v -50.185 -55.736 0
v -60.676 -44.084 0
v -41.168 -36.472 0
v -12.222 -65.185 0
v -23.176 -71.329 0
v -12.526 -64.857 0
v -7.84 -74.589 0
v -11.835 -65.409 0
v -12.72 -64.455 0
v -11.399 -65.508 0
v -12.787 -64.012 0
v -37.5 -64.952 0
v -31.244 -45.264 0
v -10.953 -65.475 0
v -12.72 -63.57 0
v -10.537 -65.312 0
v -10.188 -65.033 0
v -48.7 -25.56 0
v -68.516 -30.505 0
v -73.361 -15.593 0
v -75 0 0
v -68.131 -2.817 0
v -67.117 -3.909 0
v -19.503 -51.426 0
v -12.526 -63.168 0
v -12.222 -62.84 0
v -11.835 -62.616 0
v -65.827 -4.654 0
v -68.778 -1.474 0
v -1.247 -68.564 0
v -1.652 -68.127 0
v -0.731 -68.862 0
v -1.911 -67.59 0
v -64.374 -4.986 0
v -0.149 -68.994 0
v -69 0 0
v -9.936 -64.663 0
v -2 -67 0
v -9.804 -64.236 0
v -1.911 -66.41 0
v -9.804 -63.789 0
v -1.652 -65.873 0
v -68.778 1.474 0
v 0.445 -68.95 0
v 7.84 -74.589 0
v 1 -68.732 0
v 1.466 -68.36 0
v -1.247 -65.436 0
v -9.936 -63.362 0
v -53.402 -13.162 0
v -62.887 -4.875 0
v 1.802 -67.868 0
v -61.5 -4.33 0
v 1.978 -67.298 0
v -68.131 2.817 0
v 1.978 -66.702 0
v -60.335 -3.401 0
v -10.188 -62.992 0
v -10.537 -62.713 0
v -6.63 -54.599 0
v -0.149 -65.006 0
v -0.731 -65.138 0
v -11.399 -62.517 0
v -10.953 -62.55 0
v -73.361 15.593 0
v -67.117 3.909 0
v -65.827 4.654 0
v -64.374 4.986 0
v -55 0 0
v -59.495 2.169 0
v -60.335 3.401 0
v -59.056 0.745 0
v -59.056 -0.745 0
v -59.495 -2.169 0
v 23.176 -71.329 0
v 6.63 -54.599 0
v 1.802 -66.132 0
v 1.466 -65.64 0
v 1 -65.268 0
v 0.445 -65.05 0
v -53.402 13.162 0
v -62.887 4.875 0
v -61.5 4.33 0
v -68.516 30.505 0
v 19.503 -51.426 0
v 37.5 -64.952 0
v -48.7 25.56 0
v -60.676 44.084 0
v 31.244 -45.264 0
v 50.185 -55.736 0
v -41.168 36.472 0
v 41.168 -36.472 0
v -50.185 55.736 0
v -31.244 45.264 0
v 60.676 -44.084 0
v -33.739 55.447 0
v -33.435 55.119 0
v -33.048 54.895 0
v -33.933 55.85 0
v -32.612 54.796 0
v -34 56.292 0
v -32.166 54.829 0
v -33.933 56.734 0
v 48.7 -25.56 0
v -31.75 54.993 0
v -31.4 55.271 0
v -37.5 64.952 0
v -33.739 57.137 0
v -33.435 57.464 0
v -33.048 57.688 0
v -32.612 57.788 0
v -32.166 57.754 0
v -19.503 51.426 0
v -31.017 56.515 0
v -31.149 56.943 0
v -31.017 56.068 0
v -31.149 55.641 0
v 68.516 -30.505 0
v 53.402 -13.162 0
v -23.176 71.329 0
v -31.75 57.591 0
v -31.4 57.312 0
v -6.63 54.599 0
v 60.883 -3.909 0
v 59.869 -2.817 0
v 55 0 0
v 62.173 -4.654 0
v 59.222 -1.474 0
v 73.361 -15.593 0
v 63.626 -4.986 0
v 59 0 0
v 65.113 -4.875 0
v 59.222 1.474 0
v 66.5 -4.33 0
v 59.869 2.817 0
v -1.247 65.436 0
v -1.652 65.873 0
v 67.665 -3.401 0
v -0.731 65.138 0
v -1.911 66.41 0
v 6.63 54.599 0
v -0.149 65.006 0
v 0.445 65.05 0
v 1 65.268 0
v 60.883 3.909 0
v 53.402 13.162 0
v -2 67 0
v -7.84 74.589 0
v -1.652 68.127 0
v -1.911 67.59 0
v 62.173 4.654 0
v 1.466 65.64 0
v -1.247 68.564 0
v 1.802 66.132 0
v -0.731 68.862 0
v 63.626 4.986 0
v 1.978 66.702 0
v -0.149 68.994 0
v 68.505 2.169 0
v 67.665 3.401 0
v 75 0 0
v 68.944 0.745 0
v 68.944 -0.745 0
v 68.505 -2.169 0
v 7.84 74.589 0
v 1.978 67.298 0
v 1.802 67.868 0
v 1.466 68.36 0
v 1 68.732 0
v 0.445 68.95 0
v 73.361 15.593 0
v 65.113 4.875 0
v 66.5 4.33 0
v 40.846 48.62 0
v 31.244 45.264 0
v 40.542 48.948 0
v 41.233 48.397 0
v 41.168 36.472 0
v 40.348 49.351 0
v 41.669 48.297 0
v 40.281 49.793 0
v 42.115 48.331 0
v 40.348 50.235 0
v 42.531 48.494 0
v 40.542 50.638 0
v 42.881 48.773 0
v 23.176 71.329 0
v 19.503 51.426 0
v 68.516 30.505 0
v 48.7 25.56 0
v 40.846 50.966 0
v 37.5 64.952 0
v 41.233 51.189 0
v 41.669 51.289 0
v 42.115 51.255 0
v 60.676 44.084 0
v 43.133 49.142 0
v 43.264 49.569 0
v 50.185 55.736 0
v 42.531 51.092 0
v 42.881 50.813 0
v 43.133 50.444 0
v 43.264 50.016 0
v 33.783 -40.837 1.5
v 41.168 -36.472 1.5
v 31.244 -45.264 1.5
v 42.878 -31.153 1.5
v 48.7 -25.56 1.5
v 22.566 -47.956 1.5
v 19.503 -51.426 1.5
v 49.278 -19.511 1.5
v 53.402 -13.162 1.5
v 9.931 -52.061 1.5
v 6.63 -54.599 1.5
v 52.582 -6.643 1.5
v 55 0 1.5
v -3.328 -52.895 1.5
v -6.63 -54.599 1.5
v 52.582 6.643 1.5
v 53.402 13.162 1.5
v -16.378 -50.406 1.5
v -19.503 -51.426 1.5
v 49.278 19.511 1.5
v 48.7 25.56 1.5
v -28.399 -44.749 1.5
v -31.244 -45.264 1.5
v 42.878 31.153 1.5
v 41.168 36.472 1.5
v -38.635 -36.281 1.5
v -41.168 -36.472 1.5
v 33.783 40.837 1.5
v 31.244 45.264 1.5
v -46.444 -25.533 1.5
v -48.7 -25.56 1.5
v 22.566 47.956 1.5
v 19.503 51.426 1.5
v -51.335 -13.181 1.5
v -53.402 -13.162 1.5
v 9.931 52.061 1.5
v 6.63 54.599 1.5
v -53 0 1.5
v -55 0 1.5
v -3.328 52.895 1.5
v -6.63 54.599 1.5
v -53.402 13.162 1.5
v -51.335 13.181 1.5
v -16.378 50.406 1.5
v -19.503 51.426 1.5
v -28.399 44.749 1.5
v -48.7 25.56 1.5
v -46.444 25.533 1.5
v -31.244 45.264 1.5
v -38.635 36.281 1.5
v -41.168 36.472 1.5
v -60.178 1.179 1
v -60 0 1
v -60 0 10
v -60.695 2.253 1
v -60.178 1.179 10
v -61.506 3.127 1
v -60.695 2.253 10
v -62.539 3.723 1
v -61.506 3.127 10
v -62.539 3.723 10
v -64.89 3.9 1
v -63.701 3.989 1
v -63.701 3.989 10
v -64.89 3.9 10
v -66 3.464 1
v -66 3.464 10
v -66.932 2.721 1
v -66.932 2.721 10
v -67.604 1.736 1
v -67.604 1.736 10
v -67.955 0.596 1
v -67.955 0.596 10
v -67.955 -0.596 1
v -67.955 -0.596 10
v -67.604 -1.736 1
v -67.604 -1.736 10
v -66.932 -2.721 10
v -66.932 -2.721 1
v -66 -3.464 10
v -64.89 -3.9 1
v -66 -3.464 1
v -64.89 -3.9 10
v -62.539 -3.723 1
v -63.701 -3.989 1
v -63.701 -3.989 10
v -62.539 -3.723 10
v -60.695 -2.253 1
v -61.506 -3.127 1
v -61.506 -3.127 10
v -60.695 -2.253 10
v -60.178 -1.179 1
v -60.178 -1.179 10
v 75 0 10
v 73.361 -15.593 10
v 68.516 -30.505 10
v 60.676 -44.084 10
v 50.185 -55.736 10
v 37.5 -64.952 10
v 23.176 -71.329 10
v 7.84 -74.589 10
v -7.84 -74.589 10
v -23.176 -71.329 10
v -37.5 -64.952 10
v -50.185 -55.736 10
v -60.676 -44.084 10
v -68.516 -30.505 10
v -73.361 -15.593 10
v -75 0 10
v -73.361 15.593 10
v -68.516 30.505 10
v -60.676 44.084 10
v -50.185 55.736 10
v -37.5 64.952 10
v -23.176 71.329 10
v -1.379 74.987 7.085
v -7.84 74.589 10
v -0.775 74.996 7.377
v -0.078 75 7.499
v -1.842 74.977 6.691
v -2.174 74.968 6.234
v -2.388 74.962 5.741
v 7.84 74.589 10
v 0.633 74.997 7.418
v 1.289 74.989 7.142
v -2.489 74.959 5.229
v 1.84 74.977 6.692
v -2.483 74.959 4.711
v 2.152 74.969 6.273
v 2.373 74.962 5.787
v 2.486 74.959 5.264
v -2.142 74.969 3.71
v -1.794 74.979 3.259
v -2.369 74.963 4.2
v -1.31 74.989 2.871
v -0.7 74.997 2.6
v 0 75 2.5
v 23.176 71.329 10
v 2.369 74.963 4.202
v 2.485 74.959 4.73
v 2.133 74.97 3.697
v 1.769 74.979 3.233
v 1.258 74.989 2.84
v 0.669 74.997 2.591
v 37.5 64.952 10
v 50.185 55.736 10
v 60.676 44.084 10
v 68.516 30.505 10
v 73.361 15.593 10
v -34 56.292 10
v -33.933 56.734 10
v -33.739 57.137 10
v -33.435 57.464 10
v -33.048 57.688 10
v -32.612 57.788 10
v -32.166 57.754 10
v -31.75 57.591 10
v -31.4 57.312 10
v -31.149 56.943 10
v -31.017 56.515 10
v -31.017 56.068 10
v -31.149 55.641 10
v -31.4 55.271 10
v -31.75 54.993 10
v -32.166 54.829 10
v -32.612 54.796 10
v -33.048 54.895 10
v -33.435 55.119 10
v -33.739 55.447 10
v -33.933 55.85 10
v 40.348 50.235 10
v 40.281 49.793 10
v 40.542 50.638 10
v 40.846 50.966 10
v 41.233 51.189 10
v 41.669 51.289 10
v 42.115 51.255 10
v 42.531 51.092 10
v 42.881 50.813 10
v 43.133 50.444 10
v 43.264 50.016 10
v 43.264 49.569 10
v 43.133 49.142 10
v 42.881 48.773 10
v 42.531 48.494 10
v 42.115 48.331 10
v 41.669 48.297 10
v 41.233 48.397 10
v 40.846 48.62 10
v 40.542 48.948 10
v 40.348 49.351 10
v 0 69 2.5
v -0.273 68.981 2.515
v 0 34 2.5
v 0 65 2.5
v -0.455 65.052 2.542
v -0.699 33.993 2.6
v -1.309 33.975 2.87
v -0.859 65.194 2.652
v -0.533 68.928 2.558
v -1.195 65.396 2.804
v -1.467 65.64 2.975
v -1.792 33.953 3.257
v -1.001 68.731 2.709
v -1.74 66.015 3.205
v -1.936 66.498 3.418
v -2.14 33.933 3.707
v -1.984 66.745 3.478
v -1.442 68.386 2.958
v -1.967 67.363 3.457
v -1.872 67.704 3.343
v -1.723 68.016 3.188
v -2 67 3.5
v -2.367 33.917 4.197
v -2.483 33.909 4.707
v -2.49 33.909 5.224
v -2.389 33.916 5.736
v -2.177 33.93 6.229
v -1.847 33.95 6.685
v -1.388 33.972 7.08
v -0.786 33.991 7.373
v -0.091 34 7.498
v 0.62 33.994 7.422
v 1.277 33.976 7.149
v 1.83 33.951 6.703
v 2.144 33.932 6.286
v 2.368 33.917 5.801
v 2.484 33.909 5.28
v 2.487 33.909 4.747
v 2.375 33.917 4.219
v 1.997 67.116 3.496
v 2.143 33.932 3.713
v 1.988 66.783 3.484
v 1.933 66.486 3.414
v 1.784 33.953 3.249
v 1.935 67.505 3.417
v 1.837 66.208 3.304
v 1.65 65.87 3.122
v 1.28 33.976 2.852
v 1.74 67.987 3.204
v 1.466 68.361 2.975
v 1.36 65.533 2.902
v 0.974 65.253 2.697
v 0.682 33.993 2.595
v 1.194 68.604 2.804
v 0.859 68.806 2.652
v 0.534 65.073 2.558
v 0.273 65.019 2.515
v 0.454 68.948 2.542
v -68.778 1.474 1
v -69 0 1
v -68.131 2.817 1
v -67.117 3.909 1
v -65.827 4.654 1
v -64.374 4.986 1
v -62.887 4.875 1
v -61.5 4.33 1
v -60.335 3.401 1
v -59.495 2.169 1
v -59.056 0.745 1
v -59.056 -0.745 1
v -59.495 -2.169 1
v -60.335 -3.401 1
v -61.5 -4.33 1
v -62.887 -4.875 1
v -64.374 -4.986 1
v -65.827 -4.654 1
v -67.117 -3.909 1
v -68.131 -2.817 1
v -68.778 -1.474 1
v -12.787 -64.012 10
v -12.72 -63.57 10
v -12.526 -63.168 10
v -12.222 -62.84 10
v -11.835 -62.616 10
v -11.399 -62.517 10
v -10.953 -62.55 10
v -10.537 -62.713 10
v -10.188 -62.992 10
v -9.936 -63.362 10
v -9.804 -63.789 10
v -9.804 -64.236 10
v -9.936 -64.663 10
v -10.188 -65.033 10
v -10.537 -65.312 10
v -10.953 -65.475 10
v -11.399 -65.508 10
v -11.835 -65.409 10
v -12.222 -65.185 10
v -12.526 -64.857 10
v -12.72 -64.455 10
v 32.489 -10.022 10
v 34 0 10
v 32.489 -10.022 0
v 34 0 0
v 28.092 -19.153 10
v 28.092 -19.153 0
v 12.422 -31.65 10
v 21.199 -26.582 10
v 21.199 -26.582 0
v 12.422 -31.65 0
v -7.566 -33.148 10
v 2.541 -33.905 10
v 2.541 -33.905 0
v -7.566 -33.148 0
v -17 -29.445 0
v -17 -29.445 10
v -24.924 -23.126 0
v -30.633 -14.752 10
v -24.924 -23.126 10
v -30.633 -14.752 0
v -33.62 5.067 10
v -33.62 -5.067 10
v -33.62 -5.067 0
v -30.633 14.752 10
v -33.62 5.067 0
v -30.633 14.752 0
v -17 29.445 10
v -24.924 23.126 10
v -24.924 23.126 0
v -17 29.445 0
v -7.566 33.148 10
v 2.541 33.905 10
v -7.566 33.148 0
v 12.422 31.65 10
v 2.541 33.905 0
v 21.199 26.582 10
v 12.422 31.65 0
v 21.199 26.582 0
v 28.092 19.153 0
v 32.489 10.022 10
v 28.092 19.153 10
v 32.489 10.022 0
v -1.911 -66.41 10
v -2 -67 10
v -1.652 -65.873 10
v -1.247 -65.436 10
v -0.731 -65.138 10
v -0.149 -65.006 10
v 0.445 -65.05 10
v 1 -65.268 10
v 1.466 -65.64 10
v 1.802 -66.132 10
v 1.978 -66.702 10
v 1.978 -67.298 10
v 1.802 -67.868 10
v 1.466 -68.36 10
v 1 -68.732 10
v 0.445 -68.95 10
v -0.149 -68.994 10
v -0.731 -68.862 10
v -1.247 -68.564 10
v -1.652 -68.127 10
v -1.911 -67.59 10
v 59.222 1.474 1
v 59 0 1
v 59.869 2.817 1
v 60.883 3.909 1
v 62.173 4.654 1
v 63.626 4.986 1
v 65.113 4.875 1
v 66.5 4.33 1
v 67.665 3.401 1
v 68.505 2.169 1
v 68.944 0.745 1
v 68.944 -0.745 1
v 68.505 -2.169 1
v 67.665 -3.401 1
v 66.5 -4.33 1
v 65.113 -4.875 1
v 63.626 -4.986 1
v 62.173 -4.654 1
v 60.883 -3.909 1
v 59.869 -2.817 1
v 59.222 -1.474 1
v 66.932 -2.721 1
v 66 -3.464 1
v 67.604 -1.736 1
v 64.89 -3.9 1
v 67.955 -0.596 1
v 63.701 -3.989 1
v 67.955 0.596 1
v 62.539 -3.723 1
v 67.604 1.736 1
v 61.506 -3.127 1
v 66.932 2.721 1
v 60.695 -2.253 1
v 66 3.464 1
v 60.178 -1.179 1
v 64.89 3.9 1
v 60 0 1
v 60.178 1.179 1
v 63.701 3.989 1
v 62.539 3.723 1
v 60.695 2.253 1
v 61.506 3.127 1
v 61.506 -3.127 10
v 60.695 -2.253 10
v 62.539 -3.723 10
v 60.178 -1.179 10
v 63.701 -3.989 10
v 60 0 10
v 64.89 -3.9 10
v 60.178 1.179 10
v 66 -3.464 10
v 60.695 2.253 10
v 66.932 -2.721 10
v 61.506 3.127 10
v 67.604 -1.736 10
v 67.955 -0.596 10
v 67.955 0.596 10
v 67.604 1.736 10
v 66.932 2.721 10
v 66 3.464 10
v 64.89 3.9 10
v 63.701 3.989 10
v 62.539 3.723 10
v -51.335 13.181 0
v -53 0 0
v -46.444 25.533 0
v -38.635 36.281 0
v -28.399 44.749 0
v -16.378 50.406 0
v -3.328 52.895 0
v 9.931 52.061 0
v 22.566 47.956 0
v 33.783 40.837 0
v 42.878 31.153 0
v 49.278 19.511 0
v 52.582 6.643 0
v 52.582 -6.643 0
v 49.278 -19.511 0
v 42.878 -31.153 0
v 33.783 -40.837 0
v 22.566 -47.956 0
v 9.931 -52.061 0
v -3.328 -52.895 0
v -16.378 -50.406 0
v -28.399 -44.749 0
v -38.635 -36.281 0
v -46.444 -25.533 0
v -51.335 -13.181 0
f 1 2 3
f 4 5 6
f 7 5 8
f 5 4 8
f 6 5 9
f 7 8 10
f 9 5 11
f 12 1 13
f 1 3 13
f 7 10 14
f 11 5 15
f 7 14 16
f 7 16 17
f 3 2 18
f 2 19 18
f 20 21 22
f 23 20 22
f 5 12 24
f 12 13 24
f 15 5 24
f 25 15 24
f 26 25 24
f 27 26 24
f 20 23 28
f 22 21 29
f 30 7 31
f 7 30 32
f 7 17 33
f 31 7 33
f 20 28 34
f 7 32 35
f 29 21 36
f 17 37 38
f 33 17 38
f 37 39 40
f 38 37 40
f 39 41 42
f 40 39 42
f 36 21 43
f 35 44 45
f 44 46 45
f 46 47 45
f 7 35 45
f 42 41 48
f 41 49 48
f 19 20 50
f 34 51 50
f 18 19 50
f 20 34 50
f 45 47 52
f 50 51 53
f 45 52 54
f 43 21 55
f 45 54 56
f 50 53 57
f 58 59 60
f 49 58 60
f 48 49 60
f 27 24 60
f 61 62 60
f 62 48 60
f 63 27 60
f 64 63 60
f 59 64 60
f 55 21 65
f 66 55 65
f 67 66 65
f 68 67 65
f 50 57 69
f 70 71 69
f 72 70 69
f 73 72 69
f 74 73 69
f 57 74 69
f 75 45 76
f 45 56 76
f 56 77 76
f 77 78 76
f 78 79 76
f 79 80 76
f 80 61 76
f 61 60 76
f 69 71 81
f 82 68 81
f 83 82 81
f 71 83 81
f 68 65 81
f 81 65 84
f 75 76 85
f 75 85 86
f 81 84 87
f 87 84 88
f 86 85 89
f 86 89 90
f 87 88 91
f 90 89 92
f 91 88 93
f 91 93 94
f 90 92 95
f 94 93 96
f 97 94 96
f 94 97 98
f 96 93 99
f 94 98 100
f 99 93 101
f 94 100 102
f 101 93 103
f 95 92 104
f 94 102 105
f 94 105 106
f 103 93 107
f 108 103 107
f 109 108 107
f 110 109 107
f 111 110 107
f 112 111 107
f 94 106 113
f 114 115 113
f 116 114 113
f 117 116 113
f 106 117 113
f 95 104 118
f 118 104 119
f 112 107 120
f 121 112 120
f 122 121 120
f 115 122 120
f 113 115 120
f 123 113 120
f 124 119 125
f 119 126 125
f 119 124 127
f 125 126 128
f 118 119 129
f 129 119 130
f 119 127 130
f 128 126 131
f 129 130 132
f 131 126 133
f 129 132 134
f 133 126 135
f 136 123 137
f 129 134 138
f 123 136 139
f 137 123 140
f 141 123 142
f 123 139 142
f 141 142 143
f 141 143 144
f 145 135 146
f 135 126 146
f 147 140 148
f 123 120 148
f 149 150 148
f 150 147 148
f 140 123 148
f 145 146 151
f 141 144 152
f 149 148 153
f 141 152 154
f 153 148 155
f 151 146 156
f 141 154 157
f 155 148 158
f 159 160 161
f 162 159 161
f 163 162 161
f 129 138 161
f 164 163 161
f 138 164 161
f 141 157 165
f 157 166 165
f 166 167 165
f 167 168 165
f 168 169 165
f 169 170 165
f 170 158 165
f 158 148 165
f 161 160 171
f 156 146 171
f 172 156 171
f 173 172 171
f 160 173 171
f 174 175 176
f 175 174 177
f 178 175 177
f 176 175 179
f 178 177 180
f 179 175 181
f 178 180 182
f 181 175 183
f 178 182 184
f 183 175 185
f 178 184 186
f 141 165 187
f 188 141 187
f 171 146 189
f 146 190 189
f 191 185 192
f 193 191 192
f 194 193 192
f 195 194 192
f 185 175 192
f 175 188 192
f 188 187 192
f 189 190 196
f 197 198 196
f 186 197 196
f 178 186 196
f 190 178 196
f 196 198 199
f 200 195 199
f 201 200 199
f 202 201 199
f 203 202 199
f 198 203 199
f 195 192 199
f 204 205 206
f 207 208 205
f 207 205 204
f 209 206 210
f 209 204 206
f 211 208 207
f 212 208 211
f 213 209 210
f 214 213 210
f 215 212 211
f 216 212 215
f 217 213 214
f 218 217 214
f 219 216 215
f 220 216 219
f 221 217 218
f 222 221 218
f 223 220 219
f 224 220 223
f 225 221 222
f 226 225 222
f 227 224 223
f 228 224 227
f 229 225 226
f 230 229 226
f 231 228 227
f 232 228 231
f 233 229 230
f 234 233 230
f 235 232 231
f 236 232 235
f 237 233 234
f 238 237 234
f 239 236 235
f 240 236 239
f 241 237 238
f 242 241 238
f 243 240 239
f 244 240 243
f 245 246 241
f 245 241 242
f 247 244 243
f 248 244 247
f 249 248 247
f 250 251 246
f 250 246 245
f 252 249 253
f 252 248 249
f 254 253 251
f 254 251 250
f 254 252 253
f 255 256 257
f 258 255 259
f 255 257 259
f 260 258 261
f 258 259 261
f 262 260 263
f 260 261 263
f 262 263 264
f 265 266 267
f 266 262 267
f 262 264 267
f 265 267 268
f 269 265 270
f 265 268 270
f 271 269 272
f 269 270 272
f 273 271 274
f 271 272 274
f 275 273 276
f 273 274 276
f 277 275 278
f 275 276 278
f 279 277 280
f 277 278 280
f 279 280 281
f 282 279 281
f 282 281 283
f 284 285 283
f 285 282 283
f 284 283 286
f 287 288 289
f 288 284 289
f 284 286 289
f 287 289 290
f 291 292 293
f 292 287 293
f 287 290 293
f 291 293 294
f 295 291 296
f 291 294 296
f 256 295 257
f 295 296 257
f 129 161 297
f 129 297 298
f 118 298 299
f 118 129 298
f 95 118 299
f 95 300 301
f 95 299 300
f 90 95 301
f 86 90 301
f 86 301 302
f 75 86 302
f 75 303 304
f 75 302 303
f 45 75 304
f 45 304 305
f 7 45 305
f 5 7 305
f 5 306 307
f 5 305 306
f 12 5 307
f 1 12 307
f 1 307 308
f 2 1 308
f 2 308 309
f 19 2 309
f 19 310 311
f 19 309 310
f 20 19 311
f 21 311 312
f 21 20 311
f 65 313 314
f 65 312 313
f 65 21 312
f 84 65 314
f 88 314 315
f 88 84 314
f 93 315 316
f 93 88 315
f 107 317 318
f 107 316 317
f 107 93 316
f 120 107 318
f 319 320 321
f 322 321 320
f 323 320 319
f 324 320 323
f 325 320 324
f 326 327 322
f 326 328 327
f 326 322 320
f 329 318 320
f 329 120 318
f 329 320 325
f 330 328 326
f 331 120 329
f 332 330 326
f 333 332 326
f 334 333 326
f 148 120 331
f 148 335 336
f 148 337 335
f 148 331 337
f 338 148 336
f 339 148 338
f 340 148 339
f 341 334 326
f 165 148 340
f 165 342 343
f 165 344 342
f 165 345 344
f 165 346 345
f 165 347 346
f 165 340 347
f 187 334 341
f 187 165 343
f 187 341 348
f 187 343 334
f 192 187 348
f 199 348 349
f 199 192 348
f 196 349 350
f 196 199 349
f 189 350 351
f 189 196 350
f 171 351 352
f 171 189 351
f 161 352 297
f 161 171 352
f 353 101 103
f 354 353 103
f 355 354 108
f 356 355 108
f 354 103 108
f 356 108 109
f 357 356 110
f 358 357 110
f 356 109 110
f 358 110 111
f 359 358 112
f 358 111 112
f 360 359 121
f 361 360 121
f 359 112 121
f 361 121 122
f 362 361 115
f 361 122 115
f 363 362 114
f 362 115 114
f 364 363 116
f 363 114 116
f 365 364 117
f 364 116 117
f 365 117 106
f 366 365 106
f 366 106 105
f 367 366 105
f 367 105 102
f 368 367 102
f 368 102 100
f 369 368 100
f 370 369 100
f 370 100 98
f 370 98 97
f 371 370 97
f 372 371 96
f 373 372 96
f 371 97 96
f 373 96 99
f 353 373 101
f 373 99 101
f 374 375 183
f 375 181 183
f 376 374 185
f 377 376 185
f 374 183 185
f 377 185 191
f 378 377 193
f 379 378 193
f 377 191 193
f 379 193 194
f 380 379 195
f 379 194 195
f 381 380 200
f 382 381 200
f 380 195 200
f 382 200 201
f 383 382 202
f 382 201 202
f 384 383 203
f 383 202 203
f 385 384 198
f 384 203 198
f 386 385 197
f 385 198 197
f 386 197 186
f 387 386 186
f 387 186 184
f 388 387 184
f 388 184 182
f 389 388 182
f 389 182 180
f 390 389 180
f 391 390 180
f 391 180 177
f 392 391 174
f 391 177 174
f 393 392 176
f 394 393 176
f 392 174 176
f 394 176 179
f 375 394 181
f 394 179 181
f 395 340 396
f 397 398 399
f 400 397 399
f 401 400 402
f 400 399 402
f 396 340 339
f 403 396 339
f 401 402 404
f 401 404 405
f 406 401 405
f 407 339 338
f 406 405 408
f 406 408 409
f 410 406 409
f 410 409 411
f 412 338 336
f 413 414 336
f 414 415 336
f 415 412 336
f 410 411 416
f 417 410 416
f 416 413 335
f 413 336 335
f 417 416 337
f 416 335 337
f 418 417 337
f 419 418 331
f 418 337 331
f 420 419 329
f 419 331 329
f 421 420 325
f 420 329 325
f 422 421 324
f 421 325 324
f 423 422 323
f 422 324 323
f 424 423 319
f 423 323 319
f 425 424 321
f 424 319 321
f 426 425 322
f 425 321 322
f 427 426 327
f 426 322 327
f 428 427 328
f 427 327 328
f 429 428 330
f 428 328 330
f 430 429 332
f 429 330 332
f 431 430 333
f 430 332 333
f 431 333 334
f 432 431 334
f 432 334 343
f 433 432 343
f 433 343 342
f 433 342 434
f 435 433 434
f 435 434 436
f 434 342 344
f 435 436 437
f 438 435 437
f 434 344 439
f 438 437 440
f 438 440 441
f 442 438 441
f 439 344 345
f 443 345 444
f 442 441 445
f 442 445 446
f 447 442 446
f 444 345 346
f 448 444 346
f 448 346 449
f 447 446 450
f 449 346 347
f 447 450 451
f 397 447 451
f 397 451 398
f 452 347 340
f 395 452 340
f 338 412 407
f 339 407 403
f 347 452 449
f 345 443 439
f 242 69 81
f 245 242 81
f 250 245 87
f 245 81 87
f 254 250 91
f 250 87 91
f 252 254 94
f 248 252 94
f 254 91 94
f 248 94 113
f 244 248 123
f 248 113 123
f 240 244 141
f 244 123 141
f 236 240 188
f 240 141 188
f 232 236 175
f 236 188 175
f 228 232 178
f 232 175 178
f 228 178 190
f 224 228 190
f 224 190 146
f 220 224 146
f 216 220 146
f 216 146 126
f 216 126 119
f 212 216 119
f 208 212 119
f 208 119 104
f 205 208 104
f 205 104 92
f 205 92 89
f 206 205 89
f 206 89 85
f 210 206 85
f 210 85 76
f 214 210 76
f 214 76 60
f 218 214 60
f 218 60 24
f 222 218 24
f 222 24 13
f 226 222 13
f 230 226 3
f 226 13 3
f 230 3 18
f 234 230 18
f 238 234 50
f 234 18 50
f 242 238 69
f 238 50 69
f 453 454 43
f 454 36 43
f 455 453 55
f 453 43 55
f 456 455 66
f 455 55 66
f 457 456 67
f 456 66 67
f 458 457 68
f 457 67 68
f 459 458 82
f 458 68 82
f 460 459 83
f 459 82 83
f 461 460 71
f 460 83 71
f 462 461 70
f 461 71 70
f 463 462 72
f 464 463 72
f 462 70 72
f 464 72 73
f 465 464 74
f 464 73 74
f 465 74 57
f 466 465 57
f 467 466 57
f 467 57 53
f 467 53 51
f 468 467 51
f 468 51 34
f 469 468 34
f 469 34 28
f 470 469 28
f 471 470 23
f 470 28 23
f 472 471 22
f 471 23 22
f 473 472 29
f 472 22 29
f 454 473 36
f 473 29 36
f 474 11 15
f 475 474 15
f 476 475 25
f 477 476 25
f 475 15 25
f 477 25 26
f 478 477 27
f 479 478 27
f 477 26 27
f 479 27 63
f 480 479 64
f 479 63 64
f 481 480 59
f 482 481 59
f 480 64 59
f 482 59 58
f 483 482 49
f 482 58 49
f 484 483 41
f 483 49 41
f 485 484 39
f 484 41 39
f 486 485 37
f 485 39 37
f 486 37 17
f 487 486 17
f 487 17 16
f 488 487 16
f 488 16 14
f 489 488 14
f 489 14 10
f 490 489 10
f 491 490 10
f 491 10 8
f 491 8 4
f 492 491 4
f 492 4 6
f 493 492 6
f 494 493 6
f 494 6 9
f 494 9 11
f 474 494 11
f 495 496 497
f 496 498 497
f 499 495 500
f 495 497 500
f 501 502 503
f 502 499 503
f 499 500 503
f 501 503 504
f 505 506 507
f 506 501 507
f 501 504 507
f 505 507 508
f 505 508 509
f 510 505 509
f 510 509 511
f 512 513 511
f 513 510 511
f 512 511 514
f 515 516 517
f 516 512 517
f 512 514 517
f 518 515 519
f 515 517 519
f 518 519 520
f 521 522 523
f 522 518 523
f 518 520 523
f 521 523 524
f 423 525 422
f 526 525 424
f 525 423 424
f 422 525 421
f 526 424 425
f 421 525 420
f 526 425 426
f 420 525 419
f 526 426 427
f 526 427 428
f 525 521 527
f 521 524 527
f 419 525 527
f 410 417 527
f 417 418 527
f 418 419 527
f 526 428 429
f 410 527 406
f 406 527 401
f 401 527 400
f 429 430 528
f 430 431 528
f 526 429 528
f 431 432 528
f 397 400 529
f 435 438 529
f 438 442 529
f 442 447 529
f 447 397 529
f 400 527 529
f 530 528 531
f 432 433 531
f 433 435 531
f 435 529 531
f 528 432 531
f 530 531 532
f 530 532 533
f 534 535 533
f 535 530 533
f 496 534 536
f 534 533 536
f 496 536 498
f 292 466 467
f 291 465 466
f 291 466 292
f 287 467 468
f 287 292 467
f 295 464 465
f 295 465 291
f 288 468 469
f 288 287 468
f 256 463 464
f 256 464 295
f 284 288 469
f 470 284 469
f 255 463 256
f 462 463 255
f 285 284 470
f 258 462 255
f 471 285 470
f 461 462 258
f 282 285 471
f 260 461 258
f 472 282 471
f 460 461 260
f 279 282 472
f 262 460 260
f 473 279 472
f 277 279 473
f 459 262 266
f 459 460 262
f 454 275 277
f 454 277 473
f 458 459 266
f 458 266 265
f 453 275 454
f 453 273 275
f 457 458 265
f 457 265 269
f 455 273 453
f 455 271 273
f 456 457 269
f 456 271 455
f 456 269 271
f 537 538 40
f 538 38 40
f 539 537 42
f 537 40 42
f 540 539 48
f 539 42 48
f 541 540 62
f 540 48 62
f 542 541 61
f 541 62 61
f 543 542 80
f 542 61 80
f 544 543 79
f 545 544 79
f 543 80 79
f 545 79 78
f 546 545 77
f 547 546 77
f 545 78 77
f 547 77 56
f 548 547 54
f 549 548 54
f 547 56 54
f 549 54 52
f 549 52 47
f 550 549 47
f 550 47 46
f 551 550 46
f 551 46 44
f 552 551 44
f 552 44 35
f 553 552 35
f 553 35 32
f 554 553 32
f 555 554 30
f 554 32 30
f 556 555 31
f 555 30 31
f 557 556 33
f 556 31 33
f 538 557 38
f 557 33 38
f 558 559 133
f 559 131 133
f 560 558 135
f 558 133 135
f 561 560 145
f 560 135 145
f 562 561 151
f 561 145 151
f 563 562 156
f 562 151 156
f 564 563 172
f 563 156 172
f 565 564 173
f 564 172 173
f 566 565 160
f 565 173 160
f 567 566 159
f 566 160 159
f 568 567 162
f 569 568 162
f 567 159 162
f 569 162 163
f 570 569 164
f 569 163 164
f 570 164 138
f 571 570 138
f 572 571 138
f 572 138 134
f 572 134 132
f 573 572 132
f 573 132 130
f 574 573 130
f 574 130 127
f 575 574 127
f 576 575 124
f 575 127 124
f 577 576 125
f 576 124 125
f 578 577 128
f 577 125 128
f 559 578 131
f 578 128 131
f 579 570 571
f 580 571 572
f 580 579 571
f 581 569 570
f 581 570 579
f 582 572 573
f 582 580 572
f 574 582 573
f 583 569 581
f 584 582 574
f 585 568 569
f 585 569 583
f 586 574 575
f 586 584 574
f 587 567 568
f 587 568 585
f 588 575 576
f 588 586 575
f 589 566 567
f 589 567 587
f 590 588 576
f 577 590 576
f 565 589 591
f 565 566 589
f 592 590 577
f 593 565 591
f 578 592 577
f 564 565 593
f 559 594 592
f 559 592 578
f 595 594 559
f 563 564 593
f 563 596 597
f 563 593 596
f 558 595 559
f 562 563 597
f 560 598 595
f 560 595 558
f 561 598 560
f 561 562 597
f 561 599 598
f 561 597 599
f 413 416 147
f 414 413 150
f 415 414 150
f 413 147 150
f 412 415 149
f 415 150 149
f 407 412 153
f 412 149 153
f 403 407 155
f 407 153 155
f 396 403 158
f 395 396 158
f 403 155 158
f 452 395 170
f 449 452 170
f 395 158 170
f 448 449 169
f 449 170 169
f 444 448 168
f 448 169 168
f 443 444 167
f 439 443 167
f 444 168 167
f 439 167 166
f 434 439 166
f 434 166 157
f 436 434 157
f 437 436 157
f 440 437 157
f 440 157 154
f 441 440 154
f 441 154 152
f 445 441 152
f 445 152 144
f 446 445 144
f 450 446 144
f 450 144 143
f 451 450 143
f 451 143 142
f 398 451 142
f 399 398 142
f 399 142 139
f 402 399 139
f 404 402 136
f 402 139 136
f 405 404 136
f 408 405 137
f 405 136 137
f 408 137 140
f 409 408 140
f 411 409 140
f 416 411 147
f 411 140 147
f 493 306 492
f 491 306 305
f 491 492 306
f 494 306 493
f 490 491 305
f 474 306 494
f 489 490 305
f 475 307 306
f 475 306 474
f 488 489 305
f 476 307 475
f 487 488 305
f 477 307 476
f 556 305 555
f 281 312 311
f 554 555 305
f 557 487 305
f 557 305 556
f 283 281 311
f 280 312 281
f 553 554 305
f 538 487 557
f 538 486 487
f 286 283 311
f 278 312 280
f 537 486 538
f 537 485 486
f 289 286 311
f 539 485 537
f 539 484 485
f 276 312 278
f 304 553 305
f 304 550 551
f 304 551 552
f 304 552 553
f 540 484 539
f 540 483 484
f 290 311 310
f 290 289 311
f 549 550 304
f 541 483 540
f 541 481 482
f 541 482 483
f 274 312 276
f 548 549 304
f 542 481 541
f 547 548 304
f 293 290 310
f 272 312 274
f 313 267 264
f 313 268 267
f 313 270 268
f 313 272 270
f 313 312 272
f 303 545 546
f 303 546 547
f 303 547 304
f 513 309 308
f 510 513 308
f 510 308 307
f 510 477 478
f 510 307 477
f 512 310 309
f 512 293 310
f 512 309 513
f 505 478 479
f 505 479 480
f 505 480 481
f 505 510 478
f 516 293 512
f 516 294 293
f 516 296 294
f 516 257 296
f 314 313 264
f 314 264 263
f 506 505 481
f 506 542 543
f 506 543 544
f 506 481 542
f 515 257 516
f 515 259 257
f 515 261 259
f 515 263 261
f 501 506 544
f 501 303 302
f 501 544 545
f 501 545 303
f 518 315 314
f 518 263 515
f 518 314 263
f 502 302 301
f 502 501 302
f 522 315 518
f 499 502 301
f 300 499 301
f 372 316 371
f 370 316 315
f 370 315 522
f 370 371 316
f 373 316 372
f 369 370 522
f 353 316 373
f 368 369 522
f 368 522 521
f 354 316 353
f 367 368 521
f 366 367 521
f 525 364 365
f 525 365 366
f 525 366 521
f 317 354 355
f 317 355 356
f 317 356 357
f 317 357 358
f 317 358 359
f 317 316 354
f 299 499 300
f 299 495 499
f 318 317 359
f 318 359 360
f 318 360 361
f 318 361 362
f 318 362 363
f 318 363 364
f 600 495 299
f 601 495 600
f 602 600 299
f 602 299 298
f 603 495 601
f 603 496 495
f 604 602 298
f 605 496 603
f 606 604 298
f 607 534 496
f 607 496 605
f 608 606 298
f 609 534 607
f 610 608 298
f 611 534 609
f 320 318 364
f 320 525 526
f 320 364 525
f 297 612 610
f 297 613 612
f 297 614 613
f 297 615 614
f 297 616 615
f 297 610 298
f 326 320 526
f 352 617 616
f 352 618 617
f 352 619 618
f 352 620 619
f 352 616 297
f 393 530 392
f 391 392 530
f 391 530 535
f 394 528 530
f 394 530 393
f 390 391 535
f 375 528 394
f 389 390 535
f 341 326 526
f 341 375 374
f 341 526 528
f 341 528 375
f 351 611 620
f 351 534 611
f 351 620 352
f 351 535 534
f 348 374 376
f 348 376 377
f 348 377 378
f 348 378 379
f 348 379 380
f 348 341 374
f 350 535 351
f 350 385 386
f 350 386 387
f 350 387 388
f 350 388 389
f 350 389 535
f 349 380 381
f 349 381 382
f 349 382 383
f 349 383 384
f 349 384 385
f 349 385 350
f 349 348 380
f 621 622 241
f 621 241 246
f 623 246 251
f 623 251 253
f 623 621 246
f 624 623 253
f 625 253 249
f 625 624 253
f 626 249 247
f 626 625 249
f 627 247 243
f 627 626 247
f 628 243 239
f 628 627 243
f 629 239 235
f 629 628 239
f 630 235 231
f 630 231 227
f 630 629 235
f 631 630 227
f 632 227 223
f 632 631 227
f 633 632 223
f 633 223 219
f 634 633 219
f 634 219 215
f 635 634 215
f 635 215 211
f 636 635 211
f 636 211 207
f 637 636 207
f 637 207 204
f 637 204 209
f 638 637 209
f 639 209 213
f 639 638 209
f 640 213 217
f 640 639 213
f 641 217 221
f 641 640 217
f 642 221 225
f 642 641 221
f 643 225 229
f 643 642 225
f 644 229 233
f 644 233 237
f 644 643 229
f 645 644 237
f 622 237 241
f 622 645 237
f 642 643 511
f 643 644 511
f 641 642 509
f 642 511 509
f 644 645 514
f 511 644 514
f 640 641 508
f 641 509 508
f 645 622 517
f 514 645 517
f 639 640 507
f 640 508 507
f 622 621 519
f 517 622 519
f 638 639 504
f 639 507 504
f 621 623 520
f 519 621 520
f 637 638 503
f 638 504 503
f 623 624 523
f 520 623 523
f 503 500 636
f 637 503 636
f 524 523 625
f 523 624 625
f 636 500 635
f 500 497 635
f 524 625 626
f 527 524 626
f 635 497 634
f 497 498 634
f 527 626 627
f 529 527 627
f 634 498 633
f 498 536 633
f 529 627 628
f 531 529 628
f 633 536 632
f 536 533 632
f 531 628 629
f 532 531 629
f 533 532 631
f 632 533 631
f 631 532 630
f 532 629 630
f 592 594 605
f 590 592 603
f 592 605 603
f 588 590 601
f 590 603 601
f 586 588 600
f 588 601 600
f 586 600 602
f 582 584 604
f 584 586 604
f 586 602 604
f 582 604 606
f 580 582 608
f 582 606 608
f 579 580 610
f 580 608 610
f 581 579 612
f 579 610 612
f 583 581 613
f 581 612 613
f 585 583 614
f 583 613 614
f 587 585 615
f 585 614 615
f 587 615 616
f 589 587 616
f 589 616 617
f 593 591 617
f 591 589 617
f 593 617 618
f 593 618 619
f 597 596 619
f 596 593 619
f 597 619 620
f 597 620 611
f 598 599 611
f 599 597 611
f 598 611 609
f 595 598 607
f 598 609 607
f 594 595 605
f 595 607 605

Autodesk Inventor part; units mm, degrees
ref_plane "YZ Plane" through (0, 0, 0) normal (1, 0, 0) x (0, 1, 0)
ref_plane "XZ Plane" through (0, 0, 0) normal (0, 1, 0) x (-1, 0, 0)
ref_plane "XY Plane" through (0, 0, 0) normal (0, 0, 1) x (1, 0, 0)
sketch "Эскиз1" plane through (0, 0, 0) normal (0, 0, 1) x (1, 0, 0)
  circle A0 centre (0, 0) radius 75
  circle A1 centre (0, 0) radius 34
  dimension "d0" = 150
  dimension "d1" = 68
extrude "Выдавливание1" add sketch "Эскиз1" along normal blind 10
sketch "Эскиз2" plane through (0, 0, 10) normal (0, 0, 1) x (1, 0, 0)
  circle A0 centre (-64, 0) radius 4
  point P0 (0, 0)
  dimension "d4" = 8
  dimension "d5" = 64
extrude "Выдавливание2" cut sketch "Эскиз2" against normal blind 12
pattern_circular "Круговой массив1" count 2 over 360 about axis through (0, 0, 0) along (0, 0, 1) of "Выдавливание2"
sketch "Эскиз3" plane through (0, 0, 0) normal (0, 1, 0) x (-1, 0, 0)
  line L0 (0, 0) -> (0, 5)
  dimension "d32" = 5
hole "Отверстие1" at (0, 0, 5) direction (0, 1, 0) diameter 4.9 end through all counterbore diameter 5 counterbore depth 75.455
sketch "Эскиз4" plane through (0, 0, 0) normal (0, 0, -1) x (-1, 0, 0)
  circle A0 centre (0, 0) radius 34 projected
  line L0 (0, -34) -> (0, -67)
  circle A1 centre (0, -67) radius 2
  dimension "d18" = 33
  dimension "d33" = 4
extrude "Выдавливание3" cut sketch "Эскиз4" against normal blind 12 contours A1
sketch "Эскиз6" plane through (0, 0, 0) normal (0, 0, -1) x (-1, 0, 0)
  line L0 (0, 0) -> (0, 67)
  circle A0 centre (0, 67) radius 2
  dimension "d34" = 67
  dimension "d35" = 4
extrude "Выдавливание5" cut sketch "Эскиз6" against normal blind 5
sketch "Эскиз7" plane through (0, 0, 0) normal (0, 0, -1) x (-1, 0, 0)
  circle A0 centre (64, 0) radius 4 projected
  circle A1 centre (-64, 0) radius 4 projected
  circle A2 centre (64, 0) radius 5
  circle A3 centre (-64, 0) radius 5
  point P0 (0, 0)
  dimension "d38" = 10
  dimension "d39" = 10
extrude "Выдавливание6" cut sketch "Эскиз7" against normal blind 1
sketch "Эскиз8" plane through (0, 0, 0) normal (0, 0, -1) x (-1, 0, 0)
  circle A0 centre (32.5, 56.2917) radius 1.5 projected
  circle A1 centre (11.2871, -64.0125) radius 1.5 projected
  circle A2 centre (-41.7812, 49.7929) radius 1.5 projected
  point P0 (0, 0)
extrude "Выдавливание7" cut sketch "Эскиз8" against normal through all
sketch "Эскиз9" plane through (0, 0, 0) normal (0, 0, -1) x (-1, 0, 0)
  circle A0 centre (0, 0) radius 53
  circle A1 centre (0, 0) radius 55
  dimension "d44" = 106
  dimension "d45" = 110
extrude "Выдавливание8" cut sketch "Эскиз9" against normal blind 1.5
properties part number "В сальник" material "Чугун, серый"
